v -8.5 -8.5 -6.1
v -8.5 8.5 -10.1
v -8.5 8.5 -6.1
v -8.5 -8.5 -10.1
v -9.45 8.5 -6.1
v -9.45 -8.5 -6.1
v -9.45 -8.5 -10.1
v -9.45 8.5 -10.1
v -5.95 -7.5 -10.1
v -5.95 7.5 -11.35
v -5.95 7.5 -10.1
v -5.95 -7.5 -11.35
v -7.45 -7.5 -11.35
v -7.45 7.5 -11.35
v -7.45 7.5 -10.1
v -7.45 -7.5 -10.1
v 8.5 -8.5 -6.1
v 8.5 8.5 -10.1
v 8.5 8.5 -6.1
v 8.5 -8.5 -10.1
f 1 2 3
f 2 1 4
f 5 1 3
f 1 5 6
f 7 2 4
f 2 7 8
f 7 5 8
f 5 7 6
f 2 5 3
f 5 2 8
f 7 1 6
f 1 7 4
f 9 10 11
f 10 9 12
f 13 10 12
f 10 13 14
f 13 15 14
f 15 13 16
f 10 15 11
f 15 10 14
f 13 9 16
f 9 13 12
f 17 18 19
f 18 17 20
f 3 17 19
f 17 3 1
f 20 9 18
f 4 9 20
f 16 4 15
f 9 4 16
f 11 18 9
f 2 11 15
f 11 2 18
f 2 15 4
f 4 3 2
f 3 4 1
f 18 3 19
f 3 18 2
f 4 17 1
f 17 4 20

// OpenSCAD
depth= 6.1;
thickness = 4;
outer = 17;
inner = 13.9;
width=2.5;

module fing(){
  union(){
    translate ([0,0,-depth]) translate ([0,0,-thickness/2]) cube([outer,outer,thickness],true);
    fang();
  }
}

module fang(){
  overhang = width - ((outer-inner)/2);
  translate([-outer/2,-outer/2,-depth-thickness])// - [0,0,0])

    //mirror([0,0,0])
    translate([-overhang, 0, 0])
    union() {
    //difference()
      cube([overhang,outer,thickness]);
    translate([2, 1, -width/2]) cube([width - 1,outer -2, 2+width/2]);
  }
}
fing();
